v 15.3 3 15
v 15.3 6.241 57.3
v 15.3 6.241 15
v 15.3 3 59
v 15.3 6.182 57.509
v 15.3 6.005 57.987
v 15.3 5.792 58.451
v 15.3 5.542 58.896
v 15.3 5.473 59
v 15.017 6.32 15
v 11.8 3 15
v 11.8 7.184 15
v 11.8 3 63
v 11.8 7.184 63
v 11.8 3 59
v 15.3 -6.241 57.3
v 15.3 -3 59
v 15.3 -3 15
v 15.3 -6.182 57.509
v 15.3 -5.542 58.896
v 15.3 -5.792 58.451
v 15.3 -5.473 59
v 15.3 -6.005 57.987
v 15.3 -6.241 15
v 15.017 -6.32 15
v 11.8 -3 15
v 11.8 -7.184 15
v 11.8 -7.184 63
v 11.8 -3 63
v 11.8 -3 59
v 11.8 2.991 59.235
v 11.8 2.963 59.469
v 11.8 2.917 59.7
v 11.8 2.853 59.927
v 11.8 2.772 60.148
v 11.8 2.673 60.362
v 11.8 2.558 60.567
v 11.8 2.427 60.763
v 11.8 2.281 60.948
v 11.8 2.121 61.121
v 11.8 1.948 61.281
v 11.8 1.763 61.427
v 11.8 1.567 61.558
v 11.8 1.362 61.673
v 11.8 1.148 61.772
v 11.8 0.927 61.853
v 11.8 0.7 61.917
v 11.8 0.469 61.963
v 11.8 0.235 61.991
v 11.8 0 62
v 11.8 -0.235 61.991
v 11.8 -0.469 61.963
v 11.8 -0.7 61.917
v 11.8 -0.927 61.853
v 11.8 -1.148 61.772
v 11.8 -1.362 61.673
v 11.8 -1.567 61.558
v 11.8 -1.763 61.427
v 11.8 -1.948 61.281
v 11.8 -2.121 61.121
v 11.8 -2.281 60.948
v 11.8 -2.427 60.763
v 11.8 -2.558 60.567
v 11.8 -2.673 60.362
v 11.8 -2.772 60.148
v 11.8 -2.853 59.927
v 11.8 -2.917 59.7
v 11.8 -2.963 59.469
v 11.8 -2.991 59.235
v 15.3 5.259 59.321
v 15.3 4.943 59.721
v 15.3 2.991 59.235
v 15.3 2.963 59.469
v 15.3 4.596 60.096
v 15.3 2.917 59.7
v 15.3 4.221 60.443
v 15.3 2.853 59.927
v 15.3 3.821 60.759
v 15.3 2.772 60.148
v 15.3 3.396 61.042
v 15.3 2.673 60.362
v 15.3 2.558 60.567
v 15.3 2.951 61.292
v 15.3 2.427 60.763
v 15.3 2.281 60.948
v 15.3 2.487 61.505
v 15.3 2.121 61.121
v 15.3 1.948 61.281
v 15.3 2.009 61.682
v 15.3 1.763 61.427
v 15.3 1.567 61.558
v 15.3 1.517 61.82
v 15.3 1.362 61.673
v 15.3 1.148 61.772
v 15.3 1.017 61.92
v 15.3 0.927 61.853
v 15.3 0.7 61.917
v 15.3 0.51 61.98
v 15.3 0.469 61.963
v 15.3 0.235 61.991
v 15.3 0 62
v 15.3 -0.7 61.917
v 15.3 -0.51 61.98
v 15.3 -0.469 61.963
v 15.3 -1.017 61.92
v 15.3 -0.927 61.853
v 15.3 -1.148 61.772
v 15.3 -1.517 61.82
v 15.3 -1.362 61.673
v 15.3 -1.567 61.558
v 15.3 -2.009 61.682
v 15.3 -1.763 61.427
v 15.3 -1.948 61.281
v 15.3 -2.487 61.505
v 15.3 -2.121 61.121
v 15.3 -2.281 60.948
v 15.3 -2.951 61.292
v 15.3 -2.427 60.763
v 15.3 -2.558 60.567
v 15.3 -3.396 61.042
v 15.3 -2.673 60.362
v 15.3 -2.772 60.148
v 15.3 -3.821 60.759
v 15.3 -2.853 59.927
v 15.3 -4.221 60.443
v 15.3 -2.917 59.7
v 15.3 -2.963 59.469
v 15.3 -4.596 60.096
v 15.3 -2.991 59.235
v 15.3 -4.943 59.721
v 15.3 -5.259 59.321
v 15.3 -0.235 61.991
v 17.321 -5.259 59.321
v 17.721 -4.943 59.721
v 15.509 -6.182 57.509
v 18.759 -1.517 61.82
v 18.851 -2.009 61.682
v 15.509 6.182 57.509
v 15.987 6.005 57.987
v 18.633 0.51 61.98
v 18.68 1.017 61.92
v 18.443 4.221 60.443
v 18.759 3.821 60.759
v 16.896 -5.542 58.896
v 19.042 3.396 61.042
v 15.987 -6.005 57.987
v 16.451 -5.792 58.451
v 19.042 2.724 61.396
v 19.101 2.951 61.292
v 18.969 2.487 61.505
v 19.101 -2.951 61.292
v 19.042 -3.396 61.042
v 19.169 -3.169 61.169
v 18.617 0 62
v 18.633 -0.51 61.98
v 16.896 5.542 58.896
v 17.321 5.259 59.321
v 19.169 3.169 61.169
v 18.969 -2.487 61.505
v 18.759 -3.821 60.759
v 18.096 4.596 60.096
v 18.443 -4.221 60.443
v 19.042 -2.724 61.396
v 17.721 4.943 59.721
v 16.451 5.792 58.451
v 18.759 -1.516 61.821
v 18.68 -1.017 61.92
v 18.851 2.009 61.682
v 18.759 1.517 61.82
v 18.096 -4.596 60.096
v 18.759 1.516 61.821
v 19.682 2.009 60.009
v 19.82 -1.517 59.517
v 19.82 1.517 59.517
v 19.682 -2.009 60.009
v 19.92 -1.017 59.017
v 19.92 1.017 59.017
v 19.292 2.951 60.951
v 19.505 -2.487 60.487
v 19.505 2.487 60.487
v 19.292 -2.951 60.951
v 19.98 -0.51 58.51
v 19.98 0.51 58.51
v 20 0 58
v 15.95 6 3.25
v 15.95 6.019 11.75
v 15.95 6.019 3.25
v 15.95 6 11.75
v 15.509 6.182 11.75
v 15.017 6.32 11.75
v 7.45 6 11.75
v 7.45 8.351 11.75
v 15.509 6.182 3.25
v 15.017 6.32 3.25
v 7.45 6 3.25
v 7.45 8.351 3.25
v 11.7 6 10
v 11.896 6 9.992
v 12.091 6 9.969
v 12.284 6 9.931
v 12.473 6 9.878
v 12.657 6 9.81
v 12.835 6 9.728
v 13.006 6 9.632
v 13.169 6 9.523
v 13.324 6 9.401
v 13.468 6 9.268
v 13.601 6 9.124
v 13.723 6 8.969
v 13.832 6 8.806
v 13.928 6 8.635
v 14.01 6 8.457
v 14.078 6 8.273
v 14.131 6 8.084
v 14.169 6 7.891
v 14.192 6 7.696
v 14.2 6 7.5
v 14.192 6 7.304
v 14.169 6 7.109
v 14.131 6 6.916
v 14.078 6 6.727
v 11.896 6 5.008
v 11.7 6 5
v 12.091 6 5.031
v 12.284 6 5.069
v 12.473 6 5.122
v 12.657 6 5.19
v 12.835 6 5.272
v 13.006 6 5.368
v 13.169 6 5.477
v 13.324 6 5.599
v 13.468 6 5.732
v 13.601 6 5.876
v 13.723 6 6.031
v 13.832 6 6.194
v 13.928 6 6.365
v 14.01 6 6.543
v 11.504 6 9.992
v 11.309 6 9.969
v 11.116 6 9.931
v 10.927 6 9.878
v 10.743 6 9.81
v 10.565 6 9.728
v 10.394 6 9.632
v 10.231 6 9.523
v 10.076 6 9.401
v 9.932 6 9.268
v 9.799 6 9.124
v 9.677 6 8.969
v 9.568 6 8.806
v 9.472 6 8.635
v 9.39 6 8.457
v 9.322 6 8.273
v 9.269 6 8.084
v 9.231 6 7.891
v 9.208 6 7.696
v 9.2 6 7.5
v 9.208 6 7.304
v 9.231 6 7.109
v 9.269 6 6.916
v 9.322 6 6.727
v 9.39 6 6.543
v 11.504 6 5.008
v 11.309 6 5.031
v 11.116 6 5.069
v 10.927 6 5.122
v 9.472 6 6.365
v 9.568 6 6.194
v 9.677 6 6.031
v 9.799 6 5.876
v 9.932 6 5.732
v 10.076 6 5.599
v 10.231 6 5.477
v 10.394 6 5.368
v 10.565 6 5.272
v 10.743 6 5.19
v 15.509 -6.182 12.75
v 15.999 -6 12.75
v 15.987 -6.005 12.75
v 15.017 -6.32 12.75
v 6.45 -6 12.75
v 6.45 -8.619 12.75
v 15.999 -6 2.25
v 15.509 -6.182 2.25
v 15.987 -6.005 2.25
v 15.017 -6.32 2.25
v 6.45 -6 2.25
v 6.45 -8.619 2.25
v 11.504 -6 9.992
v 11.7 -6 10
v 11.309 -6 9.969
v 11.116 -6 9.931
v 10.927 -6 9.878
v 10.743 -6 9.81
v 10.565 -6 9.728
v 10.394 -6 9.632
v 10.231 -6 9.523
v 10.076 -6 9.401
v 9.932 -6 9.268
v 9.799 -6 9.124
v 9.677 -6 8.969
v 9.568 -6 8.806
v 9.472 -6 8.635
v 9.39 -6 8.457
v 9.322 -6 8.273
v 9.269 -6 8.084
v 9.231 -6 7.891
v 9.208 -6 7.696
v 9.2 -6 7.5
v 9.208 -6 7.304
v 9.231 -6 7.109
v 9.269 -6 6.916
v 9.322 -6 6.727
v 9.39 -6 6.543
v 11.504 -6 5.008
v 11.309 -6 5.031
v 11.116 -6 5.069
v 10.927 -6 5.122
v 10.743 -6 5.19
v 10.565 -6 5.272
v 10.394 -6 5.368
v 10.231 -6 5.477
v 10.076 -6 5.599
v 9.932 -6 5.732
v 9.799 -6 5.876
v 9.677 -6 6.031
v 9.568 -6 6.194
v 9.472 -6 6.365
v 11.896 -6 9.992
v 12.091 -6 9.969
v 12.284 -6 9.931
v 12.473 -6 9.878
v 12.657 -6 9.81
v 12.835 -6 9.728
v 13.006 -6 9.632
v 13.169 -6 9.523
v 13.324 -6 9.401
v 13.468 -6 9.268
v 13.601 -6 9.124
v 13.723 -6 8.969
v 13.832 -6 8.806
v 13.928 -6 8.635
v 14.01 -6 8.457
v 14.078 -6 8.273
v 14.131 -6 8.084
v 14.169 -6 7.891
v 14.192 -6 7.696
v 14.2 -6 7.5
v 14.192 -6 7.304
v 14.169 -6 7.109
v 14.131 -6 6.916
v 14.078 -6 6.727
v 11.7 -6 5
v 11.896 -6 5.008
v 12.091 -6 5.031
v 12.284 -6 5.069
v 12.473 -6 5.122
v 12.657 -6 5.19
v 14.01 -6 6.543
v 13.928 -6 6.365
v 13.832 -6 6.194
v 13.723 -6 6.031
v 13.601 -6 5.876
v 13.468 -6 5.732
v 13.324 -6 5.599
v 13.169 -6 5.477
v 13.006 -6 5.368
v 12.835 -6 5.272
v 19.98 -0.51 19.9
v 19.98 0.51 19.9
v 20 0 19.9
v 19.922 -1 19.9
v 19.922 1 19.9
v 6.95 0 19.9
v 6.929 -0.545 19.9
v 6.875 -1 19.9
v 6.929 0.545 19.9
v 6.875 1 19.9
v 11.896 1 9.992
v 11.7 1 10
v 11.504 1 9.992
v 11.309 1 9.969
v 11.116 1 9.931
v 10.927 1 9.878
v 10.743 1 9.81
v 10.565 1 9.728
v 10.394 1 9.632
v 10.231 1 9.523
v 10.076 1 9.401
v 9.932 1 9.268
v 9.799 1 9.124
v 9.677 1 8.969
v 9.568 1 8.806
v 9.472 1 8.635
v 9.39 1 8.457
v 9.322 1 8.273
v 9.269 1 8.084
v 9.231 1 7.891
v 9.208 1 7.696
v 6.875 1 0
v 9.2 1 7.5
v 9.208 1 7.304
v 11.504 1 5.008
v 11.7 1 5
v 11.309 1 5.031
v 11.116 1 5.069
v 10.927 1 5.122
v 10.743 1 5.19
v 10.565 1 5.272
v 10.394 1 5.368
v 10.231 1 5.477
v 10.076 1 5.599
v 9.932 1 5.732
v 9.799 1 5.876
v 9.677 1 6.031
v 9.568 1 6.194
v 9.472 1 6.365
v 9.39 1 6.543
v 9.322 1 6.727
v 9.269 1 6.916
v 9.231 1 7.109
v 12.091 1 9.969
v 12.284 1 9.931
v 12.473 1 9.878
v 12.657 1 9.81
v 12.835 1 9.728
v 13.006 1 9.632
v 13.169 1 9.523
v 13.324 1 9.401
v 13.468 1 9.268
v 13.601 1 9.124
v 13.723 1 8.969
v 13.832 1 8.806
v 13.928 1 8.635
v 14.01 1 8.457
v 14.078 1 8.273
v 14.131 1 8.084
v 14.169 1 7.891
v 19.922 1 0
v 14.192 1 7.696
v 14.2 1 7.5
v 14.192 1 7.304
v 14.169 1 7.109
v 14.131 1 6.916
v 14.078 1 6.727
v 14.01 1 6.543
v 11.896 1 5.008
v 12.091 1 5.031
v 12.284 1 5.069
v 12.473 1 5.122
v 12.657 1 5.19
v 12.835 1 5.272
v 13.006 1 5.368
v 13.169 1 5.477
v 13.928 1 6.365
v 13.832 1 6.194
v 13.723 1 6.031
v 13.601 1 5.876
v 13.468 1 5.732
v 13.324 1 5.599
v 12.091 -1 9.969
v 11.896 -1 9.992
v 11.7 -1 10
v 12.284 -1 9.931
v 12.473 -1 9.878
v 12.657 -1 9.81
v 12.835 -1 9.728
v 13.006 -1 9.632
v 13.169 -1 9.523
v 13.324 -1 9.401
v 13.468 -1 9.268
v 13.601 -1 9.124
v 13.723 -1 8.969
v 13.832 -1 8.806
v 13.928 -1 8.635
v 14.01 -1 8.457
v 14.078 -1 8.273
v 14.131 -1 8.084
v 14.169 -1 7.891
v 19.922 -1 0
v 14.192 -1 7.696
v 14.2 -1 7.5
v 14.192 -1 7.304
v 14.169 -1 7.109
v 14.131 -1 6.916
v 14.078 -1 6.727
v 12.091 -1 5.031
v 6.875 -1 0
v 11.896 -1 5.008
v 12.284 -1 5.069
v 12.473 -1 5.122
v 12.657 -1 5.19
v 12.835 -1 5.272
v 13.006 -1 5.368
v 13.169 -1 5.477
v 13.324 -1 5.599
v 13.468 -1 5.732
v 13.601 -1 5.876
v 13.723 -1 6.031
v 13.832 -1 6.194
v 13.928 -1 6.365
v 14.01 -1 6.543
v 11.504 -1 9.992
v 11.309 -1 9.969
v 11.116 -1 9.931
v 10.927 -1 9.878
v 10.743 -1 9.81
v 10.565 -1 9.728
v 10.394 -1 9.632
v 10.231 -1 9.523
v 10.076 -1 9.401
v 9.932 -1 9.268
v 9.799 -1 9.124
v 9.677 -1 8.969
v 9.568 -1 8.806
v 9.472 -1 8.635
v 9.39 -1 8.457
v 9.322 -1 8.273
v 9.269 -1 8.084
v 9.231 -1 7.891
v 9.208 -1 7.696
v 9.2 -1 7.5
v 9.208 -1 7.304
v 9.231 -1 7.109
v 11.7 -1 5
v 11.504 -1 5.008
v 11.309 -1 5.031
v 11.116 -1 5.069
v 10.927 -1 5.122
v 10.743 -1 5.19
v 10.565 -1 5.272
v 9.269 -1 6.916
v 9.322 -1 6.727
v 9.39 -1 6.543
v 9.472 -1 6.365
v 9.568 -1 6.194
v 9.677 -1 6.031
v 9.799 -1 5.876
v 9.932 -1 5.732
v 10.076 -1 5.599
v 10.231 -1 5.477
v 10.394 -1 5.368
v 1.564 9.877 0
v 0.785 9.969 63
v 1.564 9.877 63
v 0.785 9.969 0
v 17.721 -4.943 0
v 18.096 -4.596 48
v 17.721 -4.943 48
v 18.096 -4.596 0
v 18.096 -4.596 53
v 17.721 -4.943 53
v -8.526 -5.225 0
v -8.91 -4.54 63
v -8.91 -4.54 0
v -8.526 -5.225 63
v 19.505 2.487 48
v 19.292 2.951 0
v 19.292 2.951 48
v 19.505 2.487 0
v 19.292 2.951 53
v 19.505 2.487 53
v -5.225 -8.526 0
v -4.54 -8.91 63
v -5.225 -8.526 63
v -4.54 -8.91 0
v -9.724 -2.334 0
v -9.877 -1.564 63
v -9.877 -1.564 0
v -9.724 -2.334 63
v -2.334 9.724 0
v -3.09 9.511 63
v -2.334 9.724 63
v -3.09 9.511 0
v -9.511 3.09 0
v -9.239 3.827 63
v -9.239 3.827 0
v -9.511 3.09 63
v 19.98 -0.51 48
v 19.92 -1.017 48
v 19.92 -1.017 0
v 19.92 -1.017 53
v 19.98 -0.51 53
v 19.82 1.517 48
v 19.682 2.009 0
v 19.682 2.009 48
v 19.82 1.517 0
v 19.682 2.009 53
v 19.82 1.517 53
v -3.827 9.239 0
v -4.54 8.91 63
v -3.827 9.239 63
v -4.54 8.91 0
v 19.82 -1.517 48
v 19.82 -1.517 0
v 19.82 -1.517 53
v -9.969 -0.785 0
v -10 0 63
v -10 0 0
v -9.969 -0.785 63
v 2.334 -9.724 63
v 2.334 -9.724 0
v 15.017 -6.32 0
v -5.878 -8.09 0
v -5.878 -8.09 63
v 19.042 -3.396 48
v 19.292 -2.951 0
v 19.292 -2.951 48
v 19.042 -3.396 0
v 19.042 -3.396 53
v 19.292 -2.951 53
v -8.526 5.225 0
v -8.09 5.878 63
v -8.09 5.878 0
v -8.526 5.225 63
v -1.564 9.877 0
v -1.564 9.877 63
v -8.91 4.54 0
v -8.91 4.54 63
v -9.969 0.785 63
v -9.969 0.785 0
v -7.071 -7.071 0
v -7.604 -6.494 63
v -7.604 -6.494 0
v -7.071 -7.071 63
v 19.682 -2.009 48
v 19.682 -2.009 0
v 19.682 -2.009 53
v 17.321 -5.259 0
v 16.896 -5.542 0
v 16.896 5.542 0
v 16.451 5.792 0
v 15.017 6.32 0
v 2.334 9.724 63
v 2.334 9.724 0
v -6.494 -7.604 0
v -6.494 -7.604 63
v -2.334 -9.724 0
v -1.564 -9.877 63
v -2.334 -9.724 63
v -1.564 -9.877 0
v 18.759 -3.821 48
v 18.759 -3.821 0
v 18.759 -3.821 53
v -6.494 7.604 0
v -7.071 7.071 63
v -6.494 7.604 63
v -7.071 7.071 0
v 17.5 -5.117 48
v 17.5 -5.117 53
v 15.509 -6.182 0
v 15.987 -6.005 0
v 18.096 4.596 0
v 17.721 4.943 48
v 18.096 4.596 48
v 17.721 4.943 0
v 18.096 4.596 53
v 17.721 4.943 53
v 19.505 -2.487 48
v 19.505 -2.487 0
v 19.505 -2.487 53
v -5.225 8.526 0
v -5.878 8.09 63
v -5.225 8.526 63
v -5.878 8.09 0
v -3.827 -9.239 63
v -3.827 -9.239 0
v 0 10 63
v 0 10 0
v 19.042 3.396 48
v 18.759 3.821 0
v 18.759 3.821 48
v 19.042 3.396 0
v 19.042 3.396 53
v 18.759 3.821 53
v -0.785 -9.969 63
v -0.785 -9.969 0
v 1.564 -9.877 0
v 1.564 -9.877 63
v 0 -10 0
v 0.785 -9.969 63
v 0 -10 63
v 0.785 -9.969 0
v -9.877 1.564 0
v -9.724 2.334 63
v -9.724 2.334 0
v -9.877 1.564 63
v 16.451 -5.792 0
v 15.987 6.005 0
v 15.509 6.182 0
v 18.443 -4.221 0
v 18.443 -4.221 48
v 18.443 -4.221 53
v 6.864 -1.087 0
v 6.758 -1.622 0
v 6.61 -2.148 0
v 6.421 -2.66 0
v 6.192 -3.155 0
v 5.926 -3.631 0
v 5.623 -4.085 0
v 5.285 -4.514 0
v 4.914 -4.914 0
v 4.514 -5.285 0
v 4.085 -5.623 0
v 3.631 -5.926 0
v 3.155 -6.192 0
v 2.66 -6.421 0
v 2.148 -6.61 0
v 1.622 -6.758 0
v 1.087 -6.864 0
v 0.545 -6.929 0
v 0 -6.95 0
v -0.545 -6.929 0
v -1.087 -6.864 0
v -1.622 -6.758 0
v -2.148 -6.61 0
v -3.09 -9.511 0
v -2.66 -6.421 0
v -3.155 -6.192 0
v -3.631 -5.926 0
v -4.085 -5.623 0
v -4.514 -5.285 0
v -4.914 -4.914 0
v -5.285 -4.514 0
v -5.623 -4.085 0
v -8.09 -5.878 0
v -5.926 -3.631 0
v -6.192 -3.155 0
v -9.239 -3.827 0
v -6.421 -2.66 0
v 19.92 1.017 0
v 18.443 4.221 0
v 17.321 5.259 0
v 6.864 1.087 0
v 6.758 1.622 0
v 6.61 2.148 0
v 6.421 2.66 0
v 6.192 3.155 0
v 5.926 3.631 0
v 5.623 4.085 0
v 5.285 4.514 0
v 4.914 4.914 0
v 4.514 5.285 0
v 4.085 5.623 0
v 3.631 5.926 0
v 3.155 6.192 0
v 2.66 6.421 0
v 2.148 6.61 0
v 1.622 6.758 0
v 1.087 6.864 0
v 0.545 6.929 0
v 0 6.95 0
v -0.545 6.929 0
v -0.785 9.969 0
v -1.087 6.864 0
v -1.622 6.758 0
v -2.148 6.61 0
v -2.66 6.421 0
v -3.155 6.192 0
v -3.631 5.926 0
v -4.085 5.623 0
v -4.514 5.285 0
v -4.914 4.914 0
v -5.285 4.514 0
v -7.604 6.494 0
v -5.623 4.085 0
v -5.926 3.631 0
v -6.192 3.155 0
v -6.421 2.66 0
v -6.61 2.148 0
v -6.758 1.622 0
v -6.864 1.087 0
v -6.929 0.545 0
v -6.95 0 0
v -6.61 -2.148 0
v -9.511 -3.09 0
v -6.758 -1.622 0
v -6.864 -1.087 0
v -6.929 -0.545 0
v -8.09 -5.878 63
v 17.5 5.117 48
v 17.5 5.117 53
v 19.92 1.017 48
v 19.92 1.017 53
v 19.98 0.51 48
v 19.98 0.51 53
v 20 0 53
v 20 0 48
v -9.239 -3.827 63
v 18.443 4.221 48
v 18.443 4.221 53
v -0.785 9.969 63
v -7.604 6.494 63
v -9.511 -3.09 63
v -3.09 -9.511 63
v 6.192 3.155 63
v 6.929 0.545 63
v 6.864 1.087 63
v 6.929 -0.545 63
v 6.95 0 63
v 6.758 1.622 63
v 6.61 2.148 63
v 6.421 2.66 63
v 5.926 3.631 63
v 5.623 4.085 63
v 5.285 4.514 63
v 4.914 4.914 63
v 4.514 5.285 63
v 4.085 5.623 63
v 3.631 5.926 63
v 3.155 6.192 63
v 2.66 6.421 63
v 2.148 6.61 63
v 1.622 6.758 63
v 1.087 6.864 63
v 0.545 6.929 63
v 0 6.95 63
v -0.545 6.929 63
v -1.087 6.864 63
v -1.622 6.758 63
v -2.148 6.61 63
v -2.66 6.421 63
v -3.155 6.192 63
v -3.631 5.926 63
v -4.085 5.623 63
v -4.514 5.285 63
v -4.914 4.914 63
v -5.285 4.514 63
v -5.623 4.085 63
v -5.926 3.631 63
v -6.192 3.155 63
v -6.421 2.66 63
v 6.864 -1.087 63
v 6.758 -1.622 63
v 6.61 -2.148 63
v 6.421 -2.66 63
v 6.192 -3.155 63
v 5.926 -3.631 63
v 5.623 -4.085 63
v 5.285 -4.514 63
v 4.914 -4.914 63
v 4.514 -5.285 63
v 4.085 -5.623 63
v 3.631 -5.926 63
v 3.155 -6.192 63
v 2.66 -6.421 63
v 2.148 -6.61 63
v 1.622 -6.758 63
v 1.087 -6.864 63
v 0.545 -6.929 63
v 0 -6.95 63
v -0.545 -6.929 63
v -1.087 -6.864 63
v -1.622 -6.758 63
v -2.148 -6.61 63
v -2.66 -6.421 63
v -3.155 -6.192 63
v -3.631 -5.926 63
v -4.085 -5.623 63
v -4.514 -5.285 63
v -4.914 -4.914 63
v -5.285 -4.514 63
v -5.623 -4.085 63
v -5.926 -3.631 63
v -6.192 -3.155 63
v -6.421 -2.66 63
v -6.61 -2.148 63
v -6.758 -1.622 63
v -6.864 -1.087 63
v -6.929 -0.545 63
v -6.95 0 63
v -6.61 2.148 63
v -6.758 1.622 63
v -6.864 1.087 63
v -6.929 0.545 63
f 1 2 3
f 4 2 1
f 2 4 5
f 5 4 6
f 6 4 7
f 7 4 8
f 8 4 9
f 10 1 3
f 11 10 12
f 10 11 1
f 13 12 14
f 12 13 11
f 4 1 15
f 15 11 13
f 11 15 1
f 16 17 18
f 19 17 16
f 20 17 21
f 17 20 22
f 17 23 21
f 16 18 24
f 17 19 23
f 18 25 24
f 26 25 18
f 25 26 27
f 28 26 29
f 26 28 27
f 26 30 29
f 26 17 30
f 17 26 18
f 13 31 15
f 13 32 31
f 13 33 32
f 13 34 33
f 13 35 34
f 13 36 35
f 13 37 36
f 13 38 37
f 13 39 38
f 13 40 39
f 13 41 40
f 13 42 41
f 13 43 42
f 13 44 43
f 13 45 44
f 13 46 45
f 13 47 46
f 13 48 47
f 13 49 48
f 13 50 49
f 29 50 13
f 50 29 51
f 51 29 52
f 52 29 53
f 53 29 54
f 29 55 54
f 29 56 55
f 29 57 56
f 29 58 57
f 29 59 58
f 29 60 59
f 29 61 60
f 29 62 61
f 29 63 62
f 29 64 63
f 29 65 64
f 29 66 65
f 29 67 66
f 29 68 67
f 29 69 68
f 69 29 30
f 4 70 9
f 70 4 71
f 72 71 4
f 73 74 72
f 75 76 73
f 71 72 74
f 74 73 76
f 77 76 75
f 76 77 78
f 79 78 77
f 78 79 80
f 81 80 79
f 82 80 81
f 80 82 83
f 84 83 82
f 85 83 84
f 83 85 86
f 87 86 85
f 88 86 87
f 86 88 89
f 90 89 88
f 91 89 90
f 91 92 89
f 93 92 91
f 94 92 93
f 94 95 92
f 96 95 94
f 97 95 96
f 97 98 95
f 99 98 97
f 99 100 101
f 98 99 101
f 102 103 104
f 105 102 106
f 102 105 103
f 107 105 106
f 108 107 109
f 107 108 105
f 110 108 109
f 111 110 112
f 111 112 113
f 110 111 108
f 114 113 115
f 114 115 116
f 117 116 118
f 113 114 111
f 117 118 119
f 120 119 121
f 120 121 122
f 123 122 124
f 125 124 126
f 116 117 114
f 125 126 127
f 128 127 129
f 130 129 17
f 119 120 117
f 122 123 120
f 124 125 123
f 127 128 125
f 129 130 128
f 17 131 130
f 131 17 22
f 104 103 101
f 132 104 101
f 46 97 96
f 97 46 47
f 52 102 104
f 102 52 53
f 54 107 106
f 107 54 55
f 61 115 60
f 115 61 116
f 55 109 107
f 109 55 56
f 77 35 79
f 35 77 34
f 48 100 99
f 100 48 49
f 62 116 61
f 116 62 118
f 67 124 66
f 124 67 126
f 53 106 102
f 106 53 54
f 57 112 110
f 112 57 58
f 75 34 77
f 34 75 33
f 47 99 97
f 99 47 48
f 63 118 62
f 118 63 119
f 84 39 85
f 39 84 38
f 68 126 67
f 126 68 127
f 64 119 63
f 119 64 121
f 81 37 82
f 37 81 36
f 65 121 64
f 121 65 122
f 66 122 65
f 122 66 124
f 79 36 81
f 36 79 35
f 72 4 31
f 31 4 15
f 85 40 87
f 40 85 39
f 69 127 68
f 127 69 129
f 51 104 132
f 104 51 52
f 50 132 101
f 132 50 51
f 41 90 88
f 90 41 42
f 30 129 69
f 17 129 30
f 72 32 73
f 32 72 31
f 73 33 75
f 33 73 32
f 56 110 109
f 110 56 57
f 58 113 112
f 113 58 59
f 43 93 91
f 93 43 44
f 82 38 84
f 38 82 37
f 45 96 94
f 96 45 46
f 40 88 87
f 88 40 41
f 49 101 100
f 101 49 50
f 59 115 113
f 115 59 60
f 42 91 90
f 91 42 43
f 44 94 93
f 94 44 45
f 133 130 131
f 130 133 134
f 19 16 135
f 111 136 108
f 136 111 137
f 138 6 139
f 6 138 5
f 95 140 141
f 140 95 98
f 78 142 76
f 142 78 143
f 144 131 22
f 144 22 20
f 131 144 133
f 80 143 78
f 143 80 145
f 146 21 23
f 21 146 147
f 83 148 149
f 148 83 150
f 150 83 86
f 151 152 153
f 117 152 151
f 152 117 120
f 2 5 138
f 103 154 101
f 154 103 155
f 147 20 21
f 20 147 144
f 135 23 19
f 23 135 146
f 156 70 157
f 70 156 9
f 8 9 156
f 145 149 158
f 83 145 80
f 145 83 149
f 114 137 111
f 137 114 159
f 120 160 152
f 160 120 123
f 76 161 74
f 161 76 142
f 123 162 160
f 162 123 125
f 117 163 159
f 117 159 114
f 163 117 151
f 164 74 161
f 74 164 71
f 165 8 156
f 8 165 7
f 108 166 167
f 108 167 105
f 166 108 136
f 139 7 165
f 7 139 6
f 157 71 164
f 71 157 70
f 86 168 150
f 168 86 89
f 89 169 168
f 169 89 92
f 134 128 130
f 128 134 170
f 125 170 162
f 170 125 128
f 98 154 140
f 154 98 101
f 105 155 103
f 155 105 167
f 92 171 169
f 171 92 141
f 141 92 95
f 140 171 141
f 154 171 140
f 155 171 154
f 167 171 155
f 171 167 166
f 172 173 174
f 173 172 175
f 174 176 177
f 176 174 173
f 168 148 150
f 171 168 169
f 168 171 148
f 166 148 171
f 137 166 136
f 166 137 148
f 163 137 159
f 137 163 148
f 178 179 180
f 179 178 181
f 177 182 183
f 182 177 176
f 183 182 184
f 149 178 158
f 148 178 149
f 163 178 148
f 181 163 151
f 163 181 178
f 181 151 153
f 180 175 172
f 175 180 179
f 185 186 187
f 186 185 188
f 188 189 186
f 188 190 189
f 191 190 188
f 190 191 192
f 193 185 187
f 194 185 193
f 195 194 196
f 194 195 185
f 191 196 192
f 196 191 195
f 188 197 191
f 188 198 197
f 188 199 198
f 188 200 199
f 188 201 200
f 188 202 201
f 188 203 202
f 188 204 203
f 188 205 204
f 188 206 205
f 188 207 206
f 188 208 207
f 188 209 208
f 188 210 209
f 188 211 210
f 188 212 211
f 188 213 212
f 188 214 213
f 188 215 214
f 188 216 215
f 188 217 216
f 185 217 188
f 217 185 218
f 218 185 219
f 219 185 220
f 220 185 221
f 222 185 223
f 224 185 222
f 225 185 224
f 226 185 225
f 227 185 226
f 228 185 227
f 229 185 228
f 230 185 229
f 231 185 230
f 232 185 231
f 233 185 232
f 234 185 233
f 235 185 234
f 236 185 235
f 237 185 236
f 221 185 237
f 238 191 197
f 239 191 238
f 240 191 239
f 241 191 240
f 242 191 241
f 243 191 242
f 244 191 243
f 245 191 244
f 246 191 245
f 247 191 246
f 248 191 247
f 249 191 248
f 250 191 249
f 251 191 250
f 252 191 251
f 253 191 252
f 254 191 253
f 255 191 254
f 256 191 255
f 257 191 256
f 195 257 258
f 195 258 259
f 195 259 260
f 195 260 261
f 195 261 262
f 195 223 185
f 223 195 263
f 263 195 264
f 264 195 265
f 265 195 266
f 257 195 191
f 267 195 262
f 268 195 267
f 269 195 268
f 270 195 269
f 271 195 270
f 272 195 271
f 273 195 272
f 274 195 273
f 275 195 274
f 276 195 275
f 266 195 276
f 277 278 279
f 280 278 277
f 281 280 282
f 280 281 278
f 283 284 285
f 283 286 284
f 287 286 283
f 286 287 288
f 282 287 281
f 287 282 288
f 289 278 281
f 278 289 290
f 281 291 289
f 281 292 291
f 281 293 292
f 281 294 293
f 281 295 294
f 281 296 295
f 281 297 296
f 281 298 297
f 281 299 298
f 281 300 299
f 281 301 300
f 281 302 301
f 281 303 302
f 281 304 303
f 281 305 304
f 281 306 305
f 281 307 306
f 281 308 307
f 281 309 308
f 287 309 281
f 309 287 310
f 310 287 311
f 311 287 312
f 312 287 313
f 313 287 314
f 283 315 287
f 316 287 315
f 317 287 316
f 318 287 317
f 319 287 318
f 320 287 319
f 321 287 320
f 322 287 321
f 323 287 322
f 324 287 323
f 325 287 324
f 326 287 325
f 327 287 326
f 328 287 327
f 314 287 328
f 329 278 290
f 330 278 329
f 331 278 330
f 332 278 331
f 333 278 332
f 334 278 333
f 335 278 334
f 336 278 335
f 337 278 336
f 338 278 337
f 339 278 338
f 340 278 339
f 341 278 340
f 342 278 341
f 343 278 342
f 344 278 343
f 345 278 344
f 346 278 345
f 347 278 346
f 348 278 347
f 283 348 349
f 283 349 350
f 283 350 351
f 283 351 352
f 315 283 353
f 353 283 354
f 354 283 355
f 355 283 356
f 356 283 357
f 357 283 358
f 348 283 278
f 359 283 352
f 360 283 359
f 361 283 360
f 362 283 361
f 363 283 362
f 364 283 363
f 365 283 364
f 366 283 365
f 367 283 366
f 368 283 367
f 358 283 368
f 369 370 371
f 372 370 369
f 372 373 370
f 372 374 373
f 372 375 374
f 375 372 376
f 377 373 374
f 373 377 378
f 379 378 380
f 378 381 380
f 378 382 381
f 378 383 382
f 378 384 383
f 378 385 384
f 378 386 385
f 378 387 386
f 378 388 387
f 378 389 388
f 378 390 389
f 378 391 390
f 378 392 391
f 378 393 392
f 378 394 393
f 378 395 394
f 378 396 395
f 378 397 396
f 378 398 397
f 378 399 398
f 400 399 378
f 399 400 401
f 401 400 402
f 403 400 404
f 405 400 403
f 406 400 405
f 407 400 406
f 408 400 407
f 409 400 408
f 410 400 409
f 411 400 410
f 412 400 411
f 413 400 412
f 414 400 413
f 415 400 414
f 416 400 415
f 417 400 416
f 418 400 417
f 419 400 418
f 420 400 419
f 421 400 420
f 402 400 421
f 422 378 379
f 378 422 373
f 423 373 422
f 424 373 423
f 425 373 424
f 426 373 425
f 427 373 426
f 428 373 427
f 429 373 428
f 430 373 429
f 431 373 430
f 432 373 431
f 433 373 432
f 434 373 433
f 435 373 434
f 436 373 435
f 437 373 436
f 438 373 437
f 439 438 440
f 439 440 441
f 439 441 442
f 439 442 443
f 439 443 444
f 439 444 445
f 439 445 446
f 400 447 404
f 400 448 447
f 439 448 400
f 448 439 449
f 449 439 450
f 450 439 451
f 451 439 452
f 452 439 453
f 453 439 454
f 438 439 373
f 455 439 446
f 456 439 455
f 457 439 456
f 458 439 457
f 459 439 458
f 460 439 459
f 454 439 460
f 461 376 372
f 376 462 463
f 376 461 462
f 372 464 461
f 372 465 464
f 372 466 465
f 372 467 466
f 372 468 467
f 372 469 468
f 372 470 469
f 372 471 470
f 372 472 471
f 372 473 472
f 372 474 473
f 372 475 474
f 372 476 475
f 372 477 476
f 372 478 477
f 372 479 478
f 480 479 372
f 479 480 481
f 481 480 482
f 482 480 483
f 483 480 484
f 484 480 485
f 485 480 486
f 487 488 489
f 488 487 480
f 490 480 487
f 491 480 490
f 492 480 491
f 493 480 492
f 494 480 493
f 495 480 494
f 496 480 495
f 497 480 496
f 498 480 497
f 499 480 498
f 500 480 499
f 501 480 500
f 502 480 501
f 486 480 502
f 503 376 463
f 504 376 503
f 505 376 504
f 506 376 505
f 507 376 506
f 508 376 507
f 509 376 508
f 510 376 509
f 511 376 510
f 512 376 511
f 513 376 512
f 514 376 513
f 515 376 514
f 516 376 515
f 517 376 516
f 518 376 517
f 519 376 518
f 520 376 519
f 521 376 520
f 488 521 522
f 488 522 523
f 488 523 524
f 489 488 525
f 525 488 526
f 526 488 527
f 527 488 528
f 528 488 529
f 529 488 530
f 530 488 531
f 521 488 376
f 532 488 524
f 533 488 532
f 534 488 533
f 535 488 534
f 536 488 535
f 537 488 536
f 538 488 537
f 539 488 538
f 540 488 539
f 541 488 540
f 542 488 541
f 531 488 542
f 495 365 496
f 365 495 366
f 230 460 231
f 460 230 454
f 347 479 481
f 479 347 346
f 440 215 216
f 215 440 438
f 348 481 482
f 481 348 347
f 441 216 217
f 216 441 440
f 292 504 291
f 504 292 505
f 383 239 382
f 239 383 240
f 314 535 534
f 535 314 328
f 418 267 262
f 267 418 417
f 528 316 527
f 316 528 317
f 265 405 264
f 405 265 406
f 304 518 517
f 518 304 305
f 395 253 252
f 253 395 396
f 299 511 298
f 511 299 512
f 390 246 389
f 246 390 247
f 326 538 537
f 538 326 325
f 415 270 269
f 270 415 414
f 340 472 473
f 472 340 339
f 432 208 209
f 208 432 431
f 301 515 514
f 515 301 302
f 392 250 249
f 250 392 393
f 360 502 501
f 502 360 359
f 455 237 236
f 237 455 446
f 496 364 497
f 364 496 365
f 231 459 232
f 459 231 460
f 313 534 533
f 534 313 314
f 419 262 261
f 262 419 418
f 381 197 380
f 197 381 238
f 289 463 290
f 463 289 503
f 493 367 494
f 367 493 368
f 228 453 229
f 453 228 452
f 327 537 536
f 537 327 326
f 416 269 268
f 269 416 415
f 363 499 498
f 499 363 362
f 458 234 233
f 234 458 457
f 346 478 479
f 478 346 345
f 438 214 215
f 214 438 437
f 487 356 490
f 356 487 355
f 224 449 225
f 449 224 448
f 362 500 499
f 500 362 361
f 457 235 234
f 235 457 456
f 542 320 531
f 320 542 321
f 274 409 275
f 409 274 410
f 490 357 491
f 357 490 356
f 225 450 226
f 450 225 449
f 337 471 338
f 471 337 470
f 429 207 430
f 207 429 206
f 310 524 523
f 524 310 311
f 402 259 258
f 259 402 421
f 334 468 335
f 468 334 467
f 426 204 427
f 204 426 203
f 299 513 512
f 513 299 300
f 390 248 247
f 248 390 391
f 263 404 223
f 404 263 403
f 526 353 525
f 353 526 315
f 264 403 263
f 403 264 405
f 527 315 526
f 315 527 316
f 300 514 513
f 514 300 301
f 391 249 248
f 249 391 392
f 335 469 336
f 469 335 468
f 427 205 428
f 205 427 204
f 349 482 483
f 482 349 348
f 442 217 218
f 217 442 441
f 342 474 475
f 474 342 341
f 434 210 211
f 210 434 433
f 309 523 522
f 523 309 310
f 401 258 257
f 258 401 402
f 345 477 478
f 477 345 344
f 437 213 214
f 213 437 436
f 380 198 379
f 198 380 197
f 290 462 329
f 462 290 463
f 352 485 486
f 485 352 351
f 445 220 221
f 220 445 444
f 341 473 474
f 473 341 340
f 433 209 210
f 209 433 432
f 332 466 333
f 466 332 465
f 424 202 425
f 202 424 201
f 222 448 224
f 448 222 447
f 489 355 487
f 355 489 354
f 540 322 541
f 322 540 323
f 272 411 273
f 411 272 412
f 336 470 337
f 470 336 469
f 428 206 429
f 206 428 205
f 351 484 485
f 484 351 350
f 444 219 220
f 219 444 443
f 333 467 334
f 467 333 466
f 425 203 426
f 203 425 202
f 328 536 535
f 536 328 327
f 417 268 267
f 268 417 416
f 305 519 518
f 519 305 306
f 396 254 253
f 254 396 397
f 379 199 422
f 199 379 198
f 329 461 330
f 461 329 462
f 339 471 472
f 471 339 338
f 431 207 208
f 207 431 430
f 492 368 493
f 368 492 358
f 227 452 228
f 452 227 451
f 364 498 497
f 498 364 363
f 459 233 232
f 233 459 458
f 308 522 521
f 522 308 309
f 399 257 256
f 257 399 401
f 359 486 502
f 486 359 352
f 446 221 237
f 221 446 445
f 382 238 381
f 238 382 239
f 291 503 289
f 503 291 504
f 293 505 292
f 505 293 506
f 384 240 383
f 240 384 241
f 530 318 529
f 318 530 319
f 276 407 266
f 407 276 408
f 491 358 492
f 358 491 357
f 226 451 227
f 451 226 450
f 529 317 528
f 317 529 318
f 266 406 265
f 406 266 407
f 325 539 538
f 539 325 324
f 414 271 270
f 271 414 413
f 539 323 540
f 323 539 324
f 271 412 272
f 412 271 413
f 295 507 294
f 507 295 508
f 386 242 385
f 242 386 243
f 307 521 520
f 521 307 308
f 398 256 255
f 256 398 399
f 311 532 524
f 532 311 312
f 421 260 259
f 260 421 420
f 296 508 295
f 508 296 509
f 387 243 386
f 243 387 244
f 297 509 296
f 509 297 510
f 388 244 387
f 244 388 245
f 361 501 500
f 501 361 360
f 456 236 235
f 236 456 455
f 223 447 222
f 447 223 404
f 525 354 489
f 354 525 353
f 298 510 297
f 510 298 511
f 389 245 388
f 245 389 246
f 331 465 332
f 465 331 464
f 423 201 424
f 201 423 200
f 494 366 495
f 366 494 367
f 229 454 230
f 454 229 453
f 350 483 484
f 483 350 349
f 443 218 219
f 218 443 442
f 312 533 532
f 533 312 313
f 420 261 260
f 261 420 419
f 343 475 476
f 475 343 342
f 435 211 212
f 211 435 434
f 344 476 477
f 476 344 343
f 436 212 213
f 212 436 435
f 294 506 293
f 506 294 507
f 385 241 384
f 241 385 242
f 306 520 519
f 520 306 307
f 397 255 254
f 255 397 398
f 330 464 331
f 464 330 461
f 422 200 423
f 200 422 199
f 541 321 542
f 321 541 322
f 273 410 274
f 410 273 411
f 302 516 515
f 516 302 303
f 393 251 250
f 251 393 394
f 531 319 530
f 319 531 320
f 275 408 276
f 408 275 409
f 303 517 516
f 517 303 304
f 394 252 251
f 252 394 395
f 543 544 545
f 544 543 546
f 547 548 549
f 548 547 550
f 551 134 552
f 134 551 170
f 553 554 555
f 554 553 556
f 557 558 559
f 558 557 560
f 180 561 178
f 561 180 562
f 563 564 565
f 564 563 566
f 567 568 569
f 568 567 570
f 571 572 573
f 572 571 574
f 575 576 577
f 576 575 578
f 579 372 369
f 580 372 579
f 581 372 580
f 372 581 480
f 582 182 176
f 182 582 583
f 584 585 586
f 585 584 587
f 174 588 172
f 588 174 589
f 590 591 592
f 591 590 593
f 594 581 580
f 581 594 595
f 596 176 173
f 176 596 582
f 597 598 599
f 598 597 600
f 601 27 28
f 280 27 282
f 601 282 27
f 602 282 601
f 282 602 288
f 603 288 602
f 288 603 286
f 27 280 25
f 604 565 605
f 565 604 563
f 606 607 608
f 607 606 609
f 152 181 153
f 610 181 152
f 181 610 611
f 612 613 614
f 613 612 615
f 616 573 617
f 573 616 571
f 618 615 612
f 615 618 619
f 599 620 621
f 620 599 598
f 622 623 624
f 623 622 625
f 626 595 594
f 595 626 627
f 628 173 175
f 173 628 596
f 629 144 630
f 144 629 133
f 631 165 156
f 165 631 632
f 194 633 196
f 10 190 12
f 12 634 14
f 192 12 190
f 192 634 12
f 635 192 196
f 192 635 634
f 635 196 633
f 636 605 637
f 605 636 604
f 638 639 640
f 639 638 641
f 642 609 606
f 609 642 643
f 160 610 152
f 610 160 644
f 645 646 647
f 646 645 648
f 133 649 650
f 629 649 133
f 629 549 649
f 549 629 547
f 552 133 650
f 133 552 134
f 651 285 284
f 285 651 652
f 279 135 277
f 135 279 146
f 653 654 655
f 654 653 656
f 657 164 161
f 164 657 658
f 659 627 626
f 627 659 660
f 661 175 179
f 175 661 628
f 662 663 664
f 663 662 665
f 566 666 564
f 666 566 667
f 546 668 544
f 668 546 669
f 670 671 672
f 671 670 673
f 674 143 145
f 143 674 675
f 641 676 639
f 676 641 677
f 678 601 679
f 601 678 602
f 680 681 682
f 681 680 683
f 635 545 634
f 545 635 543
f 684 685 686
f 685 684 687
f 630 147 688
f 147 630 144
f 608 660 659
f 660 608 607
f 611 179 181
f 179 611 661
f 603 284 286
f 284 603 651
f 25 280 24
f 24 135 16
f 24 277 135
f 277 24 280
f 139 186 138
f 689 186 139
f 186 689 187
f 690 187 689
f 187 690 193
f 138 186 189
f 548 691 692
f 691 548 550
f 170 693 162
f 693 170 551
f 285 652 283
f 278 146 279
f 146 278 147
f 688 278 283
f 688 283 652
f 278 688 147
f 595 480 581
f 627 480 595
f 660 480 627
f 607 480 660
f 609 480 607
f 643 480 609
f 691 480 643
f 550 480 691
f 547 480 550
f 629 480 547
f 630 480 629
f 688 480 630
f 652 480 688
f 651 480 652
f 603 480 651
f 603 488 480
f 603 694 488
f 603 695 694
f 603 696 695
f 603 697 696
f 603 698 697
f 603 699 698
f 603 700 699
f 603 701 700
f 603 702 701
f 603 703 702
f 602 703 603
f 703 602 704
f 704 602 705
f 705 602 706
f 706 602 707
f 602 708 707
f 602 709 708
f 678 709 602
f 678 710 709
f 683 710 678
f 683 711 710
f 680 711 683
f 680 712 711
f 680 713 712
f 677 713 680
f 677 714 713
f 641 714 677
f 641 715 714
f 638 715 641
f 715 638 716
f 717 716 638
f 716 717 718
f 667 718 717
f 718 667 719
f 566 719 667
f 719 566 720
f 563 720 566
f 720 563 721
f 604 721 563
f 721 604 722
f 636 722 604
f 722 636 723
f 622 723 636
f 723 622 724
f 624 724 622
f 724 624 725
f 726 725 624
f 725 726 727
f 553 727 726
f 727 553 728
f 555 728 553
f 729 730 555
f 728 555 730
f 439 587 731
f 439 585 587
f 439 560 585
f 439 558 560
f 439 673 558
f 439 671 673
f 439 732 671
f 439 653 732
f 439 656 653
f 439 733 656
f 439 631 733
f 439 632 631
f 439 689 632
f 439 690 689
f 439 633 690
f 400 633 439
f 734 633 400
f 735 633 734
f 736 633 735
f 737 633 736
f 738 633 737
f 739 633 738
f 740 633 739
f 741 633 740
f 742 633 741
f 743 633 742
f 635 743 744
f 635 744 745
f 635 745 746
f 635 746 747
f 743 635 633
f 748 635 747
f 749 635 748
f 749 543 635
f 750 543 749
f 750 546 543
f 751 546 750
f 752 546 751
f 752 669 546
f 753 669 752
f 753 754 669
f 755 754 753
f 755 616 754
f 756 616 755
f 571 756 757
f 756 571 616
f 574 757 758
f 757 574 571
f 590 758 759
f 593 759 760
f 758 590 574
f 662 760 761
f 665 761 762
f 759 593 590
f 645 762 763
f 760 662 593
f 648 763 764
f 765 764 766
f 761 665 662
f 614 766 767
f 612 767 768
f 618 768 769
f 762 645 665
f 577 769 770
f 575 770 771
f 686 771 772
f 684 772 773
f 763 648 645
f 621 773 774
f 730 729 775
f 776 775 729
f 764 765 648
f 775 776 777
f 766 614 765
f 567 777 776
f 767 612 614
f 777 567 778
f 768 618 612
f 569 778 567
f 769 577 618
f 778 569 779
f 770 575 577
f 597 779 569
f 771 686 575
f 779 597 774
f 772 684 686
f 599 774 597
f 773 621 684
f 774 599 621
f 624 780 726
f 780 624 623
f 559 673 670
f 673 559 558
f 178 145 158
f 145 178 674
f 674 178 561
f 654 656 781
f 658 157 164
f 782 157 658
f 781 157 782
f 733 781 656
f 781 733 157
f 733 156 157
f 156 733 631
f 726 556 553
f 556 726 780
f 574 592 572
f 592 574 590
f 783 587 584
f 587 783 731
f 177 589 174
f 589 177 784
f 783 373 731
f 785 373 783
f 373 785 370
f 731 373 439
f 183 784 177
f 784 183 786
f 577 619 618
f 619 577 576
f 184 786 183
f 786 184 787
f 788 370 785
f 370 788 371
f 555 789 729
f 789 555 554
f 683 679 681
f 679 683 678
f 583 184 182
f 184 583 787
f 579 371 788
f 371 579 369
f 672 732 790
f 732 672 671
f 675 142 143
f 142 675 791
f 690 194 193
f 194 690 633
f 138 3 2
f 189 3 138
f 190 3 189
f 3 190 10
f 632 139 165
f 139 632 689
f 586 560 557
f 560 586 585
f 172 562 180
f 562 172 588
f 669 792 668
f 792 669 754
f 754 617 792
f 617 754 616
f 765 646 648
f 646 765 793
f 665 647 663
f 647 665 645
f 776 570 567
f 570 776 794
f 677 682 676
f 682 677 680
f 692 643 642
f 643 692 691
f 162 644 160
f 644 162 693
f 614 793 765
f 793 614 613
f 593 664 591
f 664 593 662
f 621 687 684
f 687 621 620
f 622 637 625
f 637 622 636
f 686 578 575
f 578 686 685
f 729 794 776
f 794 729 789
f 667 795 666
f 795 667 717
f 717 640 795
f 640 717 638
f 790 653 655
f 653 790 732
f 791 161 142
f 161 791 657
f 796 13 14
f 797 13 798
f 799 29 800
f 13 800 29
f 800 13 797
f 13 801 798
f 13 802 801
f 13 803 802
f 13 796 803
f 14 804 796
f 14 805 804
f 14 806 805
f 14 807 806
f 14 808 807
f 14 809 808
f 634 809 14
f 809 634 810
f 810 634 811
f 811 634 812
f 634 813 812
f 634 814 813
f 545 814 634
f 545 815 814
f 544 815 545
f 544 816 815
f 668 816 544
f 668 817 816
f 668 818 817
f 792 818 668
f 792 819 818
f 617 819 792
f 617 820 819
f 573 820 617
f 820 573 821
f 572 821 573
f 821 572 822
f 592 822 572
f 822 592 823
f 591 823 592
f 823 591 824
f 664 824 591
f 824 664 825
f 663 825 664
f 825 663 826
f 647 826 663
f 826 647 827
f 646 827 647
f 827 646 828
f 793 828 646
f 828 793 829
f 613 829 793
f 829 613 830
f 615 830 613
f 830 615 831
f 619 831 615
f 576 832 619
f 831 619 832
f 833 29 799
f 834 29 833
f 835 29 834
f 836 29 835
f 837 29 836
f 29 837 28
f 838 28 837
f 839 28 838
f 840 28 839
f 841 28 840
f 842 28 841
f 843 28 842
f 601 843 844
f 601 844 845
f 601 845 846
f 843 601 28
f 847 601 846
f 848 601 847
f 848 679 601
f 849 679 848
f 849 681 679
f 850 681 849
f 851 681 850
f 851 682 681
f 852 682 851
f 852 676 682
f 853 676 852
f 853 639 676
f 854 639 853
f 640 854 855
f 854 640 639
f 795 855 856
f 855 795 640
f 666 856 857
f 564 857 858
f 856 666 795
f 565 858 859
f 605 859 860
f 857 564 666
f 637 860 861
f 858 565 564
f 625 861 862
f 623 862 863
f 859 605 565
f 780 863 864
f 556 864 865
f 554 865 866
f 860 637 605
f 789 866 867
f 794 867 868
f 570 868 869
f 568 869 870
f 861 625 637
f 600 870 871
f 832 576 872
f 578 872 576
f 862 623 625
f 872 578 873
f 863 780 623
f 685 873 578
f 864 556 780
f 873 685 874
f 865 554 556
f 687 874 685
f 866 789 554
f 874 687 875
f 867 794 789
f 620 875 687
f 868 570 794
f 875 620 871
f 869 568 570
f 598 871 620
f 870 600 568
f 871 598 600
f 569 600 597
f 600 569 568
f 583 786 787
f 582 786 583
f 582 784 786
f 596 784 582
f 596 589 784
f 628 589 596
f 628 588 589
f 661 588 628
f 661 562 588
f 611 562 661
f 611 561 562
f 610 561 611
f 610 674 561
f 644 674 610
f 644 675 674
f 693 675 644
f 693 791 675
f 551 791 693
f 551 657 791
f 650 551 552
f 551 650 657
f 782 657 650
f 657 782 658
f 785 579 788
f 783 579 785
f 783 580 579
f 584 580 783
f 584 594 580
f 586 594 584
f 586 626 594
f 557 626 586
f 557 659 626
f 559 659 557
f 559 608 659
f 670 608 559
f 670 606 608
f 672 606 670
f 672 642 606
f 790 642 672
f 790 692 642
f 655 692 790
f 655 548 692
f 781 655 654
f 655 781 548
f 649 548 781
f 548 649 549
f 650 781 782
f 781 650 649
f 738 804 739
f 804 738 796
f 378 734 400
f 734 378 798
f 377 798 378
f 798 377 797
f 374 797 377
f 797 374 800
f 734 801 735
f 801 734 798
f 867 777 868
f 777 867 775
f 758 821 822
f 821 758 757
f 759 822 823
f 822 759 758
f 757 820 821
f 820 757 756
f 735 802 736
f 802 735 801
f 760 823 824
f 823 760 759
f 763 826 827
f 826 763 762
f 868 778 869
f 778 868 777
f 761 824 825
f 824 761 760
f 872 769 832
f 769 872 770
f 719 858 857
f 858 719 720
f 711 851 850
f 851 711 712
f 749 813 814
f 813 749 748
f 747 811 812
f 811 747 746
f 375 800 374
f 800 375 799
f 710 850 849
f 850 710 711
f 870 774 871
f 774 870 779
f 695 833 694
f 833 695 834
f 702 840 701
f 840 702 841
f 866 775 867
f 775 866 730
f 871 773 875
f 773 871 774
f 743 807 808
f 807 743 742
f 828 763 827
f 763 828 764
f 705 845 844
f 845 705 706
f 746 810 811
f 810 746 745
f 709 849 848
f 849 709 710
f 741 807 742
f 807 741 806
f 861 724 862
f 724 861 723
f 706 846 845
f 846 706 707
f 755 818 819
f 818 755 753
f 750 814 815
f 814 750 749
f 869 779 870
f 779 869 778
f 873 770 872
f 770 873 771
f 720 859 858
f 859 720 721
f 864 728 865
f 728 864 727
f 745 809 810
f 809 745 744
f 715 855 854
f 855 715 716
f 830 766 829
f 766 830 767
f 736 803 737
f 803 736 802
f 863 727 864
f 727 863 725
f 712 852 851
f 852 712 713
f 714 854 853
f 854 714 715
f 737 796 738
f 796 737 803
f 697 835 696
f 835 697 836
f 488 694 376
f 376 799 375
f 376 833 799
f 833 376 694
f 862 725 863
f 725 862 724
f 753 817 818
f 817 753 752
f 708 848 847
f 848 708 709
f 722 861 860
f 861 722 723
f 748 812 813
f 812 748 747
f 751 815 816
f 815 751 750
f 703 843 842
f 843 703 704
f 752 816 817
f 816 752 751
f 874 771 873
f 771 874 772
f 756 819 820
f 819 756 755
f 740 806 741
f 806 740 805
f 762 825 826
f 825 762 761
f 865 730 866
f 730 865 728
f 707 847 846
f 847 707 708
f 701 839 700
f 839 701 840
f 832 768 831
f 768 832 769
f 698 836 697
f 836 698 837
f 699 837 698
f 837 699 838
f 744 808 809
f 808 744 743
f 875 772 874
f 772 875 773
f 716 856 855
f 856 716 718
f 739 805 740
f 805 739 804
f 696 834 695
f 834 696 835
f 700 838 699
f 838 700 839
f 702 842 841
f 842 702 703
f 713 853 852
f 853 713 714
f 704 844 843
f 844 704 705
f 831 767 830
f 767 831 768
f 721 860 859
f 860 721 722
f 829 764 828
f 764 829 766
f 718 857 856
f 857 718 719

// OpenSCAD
/*

  Schlosshalter fuer Tubus Locc Gepaecktraeger

    Autor: Marc Hoppe (mhop@posteo.de), Bielefeld 2018

    This program is free software: you can redistribute it and/or modify
    it under the terms of the GNU General Public License as published by
    the Free Software Foundation, either version 3 of the License, or
    (at your option) any later version.

    This program is distributed in the hope that it will be useful,
    but WITHOUT ANY WARRANTY; without even the implied warranty of
    MERCHANTABILITY or FITNESS FOR A PARTICULAR PURPOSE.  See the
    GNU General Public License for more details.

    You should have received a copy of the GNU General Public License
    along with this program.  If not, see <https://www.gnu.org/licenses/>.
*/

d=13.9;

schlosshalter(d=d);

$fn=80;

module schlosshalter(d)
{
    l=62;
    rk=13/2;
    a=13.5;

    difference() {
        hull() {
            translate ([0,0,0]) platte(rk=rk, rg=10, a=a);
            translate ([0,0,l]) platte(rk=rk, rg=10, a=a);
        }
        ab=a+rk-3.5-5;
        fuehrung(l, off=15, d=3.5, steg=6, ab=ab+0.3); // etwas höher
        rundfuehrung();
        abr=a+rk-2.5;
        riegel(off=48, d=5, ab=abr);
        schloss(l, dm=d);
        klemmung(r=d/2, d=2);
    }
}


module rundfuehrung() 
{
    l=62;
    steg=6;
    w=13;

    translate ([11.8,0,l-steg/2]) rotate([-90,0,-90])
        rohrhalb(ri=steg/2,ra=20,l=3.5);

    translate ([15,0,l-w/2]) rotate([-90,0,-90])
        rohrhalb(ri=w/2,ra=20,l=10);

    translate ([13.5,-10,l-4]) rotate([-90,0,0])
        rohrviertel(ri=w/2,ra=20,l=20);
}

module rohrhalb(ri, ra, l)
{
    difference() {
        rohr(ri, ra, l);
        translate ([-ra-0.1,0,-0.1]) cube([ra*2+0.2,ra+0.2,l+0.2]);
    }
}

module klemmung(r, d)
{
    rschl=r-1.5;
    len=15;
    d_schraube=10.5;
    a_mutter=8.5;
    rl=5/2;
    translate ([rschl+2, 6, len/2-a_mutter/2])
        cube([a_mutter,a_mutter,a_mutter]);
    translate ([rschl+2+a_mutter/2-d_schraube/2, -6-d_schraube, len/2-d_schraube/2]) 
        cube([d_schraube,d_schraube,d_schraube]);
    translate ([rschl-1, -d/2,-0.1]) cube([17,d,len+5]);
    translate ([rschl+2+a_mutter/2,0,len/2]) rotate([90,0,0]) cylinder(r=rl, h=40, center=true);
}

module schraege()
{
    translate ([-20+18,-10,42]) rotate([-90,0,0])
        rohrviertel(20,28,20);
}

module rohrviertel(ri,ra,l)
{
    difference() {
        rohr(ri,ra,l);
        translate ([-ra,0,-0.1]) cube([ra*2,ra,l+0.2]);
        translate ([-ra,-ra,-0.1]) cube([ra,ra*2,l+0.2]);
    }
}

module schloss(l, dm)
{
    translate ([0,0,-5]) cylinder(r=dm/2, h=l+10);
}

module riegel(off, d, ab)
{
    w=20;
    translate ([ab,-w/2, off]) cube([10,w,d]);
}

module fuehrung(l, off, d, steg, ab)
{
    w=20;
    translate ([ab, steg/2,  off]) cube([d,w,l]);
    translate ([ab,-steg/2-w,off]) cube([d,w,l]);
}

module platte(rk,rg,a)
{
    d=1;
    hull() {
        translate ([0,0,0]) cylinder(r=rg,h=d);
        translate ([a,0,0]) cylinder(r=rk,h=d);
    }
}

module rohr(ri,ra,l)
{
    difference() {
        cylinder(r=ra, h=l);
        translate ([0,0,-0.1])cylinder(r=ri, h=l+0.2);
    }
}
